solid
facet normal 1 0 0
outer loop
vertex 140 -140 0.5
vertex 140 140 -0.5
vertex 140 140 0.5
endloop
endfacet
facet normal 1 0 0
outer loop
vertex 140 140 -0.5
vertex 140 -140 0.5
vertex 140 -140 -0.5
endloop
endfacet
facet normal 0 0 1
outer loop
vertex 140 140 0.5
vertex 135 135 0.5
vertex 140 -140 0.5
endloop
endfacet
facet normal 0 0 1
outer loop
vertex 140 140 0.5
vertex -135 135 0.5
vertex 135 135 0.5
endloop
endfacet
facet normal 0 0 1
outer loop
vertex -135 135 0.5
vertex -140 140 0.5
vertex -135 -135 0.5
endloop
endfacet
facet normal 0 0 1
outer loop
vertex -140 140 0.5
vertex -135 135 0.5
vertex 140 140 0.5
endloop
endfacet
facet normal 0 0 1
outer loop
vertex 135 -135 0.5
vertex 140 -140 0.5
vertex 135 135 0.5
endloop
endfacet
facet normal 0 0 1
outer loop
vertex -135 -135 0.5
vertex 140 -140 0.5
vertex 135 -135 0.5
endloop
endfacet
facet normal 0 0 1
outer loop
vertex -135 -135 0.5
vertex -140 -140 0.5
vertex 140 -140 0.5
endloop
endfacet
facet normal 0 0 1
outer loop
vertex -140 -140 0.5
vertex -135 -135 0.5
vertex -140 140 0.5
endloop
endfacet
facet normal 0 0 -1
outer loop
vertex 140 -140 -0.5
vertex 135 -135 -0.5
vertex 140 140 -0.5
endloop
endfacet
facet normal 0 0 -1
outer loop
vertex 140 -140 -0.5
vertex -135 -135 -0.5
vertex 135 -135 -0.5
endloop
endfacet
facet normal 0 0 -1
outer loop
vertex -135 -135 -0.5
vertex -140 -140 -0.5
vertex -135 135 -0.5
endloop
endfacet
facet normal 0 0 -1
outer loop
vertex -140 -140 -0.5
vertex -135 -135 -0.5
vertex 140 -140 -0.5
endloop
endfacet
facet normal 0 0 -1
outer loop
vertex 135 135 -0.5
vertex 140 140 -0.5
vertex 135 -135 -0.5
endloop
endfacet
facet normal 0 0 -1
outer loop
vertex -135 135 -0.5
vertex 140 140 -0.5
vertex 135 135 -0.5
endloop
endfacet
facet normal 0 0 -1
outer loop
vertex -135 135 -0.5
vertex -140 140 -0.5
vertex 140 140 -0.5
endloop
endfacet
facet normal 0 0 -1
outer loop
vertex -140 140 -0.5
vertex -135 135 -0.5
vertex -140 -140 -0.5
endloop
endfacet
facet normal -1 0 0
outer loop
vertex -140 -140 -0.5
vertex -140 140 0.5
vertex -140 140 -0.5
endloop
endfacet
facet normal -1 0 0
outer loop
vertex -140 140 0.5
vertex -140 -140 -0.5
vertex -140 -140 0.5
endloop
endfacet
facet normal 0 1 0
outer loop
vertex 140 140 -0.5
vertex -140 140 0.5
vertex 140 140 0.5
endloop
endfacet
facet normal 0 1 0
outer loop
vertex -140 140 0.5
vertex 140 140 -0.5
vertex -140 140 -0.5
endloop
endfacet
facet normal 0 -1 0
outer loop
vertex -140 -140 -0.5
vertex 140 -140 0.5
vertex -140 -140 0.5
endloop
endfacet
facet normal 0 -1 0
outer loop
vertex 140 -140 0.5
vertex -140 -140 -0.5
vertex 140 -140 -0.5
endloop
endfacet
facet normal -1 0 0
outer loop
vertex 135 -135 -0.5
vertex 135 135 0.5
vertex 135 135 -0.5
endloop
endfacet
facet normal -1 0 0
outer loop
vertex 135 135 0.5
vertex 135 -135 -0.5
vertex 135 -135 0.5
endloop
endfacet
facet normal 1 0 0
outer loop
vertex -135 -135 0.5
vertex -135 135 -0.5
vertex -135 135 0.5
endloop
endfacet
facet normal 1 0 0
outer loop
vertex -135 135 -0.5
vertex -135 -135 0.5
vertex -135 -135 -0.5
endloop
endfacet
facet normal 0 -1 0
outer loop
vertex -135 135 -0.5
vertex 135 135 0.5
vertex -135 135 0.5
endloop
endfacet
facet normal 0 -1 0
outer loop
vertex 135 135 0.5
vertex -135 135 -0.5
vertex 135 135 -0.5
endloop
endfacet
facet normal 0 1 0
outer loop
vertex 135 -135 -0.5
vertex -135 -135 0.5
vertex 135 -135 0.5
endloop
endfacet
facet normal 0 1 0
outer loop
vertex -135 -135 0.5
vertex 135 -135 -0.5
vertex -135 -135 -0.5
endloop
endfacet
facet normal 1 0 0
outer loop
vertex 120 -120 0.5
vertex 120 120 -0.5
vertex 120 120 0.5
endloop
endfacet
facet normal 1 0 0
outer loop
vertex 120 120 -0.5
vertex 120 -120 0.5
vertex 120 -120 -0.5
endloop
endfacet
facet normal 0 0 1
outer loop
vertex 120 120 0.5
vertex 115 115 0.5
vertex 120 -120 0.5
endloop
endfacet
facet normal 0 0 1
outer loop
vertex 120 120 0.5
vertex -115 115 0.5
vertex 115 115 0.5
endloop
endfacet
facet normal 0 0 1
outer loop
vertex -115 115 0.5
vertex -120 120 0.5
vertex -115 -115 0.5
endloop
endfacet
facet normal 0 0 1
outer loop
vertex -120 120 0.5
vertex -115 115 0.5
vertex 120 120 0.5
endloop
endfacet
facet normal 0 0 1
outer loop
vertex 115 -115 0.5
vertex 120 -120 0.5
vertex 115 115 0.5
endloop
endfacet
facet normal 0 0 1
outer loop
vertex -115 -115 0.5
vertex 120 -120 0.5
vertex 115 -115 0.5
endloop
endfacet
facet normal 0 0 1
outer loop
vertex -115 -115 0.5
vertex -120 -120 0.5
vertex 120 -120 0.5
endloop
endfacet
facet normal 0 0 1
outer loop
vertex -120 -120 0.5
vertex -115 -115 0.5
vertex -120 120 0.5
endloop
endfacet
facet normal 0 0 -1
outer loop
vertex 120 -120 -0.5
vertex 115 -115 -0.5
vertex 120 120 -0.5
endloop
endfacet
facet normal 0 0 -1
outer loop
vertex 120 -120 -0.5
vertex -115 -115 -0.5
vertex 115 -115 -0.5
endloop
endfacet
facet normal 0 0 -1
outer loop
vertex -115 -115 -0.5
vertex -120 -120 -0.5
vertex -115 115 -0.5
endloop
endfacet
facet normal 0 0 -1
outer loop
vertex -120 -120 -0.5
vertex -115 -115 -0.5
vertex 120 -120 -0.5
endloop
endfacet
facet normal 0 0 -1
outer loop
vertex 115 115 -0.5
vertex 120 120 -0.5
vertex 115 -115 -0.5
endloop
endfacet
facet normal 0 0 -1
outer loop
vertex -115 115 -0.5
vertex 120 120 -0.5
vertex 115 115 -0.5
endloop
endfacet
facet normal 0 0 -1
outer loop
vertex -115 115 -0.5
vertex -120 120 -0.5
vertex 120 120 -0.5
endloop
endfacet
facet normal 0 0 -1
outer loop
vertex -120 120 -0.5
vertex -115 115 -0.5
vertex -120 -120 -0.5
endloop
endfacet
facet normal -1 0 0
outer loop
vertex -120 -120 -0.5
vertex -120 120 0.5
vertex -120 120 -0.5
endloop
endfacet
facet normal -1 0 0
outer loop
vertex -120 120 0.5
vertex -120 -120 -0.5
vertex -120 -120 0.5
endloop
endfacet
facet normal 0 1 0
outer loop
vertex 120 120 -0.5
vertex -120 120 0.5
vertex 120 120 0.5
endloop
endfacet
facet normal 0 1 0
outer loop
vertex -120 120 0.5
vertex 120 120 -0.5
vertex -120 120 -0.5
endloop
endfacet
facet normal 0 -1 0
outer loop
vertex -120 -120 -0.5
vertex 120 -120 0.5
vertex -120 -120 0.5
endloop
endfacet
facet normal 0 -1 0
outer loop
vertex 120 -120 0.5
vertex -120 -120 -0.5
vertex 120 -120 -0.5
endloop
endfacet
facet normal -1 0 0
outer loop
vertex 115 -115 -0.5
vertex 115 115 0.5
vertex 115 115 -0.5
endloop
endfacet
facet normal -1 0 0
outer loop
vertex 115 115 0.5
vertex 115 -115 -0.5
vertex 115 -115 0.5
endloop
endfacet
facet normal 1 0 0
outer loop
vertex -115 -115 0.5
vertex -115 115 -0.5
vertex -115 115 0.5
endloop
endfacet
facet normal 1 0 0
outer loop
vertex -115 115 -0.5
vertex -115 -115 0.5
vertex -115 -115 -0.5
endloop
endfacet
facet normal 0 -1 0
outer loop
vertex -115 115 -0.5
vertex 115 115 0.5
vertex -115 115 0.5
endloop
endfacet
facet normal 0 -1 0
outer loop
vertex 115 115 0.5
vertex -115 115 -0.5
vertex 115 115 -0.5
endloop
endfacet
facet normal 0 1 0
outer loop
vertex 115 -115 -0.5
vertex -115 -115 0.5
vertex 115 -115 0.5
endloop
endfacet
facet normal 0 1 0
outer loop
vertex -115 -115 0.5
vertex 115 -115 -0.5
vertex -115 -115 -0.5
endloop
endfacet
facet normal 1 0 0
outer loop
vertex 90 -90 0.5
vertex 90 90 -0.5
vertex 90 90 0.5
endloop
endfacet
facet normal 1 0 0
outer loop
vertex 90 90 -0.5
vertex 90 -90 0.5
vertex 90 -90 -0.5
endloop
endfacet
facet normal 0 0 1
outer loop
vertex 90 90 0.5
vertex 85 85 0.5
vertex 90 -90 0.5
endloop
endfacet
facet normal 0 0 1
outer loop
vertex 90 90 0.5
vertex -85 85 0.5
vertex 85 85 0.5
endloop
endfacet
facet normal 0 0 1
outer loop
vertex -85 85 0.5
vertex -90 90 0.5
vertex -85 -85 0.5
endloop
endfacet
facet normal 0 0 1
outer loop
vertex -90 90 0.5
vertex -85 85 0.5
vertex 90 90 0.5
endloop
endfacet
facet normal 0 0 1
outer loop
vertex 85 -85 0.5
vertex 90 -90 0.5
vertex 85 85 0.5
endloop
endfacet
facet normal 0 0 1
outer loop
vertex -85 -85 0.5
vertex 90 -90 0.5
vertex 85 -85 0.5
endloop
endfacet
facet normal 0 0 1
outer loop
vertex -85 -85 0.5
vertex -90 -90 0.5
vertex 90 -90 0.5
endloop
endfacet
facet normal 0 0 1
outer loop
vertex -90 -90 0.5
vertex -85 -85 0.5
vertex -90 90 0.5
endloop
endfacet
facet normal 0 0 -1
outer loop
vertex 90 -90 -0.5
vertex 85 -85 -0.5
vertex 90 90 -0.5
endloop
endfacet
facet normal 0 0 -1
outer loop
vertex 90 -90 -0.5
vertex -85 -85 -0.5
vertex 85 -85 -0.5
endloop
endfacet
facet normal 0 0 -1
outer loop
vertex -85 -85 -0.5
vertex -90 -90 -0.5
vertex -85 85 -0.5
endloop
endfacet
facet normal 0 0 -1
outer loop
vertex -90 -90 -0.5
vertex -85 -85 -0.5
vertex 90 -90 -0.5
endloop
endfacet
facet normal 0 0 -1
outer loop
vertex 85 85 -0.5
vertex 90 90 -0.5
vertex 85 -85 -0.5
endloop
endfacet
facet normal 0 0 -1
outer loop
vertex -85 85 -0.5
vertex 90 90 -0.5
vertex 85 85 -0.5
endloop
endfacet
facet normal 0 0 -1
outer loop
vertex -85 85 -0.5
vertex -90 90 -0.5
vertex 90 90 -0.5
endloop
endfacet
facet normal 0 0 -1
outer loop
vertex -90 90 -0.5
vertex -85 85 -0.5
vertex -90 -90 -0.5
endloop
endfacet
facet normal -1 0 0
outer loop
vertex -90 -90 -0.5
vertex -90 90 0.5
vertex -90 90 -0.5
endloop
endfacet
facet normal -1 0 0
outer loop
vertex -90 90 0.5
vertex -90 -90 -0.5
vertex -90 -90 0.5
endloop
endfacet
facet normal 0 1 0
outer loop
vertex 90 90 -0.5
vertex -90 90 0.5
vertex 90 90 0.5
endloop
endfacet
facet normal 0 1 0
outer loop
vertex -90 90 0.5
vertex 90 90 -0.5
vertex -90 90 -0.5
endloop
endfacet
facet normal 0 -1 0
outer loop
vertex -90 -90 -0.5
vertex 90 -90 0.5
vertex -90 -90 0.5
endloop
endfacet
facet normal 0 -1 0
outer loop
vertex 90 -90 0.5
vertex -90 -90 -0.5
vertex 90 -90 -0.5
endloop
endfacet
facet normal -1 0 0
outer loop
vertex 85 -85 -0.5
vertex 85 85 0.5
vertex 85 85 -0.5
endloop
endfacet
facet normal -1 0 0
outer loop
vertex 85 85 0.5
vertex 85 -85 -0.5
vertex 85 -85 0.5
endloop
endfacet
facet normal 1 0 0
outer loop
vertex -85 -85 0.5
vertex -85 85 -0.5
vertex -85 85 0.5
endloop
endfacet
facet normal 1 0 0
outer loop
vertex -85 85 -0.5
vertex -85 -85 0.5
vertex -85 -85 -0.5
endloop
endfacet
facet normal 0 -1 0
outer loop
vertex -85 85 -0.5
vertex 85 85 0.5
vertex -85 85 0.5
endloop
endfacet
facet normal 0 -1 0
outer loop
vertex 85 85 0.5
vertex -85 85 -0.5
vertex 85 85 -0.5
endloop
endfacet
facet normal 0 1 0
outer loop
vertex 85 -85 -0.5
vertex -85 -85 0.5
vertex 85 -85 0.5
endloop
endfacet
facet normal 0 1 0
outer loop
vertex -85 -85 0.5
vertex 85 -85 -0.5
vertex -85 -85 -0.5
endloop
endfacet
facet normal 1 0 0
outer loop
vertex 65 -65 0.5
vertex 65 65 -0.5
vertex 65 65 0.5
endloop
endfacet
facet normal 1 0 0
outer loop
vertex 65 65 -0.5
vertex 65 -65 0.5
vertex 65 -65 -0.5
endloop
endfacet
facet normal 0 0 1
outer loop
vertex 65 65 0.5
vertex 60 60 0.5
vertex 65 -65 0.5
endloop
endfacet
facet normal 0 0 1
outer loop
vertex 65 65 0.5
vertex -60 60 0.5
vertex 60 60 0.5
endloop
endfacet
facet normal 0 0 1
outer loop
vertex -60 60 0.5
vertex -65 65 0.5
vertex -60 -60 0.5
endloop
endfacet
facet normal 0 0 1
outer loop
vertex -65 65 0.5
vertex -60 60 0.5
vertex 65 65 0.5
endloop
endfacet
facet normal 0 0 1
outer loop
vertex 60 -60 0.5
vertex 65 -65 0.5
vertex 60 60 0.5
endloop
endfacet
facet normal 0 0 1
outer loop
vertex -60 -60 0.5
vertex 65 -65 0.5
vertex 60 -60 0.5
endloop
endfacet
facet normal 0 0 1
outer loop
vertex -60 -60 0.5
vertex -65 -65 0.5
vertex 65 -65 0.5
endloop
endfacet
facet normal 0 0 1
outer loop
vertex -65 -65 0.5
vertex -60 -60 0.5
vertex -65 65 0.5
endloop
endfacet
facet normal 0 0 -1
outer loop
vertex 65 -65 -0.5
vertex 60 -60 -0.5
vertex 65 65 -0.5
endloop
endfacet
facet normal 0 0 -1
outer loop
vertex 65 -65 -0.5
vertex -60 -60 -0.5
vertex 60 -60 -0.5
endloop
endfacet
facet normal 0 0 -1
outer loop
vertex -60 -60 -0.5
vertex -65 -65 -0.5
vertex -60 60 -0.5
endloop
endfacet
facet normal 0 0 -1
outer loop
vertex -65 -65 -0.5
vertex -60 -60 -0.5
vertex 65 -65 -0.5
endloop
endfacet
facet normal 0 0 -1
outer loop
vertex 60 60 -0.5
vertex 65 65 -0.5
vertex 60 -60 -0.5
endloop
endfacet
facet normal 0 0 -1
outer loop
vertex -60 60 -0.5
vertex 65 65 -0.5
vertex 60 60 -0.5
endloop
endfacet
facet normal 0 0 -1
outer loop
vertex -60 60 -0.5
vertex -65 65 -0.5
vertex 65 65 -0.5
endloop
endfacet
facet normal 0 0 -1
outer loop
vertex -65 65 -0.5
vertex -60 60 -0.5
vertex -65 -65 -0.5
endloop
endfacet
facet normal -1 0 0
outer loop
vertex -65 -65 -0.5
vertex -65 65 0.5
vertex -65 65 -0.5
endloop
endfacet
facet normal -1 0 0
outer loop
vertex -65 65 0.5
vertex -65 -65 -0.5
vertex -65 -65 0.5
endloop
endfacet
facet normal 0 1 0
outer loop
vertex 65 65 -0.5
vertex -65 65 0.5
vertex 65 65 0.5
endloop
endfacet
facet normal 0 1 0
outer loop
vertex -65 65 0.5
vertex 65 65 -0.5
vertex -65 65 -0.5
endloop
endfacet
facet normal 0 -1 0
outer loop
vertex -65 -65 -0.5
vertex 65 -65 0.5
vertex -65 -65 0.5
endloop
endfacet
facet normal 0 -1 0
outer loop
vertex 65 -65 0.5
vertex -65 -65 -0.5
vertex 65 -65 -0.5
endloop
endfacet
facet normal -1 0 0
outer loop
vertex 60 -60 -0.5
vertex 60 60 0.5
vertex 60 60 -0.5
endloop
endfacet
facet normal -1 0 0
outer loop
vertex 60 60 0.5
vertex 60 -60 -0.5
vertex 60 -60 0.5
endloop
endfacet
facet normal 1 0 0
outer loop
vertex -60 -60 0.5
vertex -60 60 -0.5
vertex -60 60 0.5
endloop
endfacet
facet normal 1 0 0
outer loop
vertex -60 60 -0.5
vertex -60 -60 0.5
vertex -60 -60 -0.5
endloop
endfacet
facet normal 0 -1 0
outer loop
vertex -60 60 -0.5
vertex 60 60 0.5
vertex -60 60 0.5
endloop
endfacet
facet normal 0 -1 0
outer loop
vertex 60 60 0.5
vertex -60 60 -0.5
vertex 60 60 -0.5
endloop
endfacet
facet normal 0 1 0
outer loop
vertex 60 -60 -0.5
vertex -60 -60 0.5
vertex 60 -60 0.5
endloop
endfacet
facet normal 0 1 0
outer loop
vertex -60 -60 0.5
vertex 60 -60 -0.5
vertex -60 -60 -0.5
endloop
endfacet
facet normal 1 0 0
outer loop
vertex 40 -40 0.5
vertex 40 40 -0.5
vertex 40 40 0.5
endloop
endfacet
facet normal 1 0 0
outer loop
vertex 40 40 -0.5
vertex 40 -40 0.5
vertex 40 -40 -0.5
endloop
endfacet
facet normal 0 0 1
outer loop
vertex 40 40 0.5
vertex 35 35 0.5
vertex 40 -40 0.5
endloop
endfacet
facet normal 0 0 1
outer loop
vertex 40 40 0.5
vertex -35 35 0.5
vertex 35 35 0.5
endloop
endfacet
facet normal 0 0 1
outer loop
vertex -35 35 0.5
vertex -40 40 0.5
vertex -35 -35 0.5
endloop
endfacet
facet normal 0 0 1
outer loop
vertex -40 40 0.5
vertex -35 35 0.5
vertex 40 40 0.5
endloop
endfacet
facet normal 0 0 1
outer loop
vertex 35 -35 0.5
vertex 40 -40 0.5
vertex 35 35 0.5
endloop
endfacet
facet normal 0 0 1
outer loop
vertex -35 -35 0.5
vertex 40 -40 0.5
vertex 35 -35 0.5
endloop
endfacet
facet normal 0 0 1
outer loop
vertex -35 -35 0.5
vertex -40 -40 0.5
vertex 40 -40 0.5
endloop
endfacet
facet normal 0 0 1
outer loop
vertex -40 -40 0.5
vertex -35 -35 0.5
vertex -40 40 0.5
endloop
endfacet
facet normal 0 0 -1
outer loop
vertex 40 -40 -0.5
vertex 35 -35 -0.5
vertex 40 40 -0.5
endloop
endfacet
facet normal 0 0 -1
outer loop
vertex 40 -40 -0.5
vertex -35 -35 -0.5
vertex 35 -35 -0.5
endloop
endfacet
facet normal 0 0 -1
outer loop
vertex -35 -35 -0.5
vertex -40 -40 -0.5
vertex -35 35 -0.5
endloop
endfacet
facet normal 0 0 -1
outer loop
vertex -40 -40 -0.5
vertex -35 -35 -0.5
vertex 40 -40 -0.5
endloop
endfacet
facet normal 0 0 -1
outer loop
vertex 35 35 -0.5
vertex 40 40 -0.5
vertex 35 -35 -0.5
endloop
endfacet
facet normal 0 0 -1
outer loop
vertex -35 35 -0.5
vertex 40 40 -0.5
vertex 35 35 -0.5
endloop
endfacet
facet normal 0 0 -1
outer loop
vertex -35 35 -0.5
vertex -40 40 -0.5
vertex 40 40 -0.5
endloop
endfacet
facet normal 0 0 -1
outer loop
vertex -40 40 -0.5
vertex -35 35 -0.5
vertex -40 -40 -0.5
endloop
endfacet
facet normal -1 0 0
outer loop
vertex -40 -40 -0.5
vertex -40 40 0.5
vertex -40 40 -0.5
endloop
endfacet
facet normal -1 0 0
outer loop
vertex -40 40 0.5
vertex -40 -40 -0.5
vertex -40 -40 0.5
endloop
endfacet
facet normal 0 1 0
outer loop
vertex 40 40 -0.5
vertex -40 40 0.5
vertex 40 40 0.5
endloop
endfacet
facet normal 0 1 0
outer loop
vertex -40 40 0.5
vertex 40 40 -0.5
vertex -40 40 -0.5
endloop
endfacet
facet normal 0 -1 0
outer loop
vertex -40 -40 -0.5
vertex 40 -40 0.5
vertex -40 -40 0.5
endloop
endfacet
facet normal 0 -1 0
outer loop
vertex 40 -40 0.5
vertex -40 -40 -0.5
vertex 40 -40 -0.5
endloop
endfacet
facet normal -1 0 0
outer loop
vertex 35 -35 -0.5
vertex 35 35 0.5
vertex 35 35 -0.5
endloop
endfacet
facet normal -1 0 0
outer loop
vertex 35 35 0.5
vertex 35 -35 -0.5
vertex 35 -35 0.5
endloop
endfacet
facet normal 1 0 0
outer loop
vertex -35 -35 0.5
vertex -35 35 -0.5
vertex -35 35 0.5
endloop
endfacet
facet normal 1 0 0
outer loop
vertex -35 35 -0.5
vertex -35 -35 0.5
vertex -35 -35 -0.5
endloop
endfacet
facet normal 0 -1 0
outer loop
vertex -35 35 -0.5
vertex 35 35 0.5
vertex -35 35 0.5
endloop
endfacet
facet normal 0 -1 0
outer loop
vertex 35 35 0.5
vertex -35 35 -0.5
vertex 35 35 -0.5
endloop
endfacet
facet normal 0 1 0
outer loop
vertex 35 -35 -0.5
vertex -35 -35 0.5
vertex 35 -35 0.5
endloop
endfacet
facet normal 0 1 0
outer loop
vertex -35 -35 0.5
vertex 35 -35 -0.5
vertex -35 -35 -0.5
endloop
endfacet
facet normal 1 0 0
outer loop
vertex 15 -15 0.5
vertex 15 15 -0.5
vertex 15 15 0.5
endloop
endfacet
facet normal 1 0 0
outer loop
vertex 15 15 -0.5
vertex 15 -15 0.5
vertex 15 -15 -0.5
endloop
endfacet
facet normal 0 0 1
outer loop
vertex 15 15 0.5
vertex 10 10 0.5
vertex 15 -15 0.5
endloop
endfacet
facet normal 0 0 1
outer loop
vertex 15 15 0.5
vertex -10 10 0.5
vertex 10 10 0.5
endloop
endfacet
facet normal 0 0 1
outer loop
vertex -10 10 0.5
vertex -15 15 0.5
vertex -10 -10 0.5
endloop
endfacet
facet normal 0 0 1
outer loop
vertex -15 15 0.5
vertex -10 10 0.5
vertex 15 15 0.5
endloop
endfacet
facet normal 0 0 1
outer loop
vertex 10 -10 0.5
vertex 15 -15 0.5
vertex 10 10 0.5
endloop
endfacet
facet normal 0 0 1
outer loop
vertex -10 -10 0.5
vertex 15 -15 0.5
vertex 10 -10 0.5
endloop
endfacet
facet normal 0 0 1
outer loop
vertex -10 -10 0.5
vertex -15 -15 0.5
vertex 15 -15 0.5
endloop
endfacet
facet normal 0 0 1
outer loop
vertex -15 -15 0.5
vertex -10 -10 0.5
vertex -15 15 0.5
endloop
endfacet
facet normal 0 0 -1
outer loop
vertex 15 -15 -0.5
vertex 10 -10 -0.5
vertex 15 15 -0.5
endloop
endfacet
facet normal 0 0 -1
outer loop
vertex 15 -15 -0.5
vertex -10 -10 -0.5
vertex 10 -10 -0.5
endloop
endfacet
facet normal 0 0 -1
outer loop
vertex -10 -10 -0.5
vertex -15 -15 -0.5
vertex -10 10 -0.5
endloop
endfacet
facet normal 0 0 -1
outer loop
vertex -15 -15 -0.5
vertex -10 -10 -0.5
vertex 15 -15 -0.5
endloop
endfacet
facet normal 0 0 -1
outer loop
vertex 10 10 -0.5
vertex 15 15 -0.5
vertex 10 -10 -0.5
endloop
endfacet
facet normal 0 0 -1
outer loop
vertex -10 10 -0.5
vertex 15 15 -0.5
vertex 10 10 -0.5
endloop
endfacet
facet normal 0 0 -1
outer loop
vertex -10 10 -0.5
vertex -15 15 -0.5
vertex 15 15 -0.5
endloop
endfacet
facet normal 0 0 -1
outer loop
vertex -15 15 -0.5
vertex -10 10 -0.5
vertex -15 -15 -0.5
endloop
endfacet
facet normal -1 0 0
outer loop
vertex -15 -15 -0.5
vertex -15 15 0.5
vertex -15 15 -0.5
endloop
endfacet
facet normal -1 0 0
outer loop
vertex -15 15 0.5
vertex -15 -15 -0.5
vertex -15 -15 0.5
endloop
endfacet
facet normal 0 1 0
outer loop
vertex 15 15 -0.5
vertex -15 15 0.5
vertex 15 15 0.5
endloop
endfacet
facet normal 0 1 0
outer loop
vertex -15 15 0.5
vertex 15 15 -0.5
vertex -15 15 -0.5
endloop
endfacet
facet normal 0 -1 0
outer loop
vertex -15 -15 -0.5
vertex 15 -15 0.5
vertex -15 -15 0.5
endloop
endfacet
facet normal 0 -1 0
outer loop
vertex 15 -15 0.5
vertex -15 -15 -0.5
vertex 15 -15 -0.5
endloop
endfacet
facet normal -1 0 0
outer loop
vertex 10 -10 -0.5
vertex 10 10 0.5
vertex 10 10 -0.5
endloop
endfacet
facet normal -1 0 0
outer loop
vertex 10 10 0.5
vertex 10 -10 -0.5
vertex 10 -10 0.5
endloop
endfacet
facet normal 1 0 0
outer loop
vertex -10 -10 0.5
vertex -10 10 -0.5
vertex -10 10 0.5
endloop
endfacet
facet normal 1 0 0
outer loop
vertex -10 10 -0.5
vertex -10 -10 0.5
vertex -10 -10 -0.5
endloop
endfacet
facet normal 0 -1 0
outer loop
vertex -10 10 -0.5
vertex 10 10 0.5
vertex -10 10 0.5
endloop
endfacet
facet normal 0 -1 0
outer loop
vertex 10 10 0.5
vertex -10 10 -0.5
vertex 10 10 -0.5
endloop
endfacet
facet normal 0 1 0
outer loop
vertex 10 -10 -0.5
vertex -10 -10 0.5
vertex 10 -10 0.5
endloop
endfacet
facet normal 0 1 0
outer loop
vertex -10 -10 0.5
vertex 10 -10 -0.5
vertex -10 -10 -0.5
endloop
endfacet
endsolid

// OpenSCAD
module ramme(xy, bredde) {
    difference() {
        cube([xy,xy,1], center=true);
        cube([xy-bredde,xy-bredde,1], center=true);
    }
}

ramme(280, 10);
ramme(240, 10);
ramme(180, 10);
ramme(130, 10);
ramme(80, 10);
ramme(30, 10);
